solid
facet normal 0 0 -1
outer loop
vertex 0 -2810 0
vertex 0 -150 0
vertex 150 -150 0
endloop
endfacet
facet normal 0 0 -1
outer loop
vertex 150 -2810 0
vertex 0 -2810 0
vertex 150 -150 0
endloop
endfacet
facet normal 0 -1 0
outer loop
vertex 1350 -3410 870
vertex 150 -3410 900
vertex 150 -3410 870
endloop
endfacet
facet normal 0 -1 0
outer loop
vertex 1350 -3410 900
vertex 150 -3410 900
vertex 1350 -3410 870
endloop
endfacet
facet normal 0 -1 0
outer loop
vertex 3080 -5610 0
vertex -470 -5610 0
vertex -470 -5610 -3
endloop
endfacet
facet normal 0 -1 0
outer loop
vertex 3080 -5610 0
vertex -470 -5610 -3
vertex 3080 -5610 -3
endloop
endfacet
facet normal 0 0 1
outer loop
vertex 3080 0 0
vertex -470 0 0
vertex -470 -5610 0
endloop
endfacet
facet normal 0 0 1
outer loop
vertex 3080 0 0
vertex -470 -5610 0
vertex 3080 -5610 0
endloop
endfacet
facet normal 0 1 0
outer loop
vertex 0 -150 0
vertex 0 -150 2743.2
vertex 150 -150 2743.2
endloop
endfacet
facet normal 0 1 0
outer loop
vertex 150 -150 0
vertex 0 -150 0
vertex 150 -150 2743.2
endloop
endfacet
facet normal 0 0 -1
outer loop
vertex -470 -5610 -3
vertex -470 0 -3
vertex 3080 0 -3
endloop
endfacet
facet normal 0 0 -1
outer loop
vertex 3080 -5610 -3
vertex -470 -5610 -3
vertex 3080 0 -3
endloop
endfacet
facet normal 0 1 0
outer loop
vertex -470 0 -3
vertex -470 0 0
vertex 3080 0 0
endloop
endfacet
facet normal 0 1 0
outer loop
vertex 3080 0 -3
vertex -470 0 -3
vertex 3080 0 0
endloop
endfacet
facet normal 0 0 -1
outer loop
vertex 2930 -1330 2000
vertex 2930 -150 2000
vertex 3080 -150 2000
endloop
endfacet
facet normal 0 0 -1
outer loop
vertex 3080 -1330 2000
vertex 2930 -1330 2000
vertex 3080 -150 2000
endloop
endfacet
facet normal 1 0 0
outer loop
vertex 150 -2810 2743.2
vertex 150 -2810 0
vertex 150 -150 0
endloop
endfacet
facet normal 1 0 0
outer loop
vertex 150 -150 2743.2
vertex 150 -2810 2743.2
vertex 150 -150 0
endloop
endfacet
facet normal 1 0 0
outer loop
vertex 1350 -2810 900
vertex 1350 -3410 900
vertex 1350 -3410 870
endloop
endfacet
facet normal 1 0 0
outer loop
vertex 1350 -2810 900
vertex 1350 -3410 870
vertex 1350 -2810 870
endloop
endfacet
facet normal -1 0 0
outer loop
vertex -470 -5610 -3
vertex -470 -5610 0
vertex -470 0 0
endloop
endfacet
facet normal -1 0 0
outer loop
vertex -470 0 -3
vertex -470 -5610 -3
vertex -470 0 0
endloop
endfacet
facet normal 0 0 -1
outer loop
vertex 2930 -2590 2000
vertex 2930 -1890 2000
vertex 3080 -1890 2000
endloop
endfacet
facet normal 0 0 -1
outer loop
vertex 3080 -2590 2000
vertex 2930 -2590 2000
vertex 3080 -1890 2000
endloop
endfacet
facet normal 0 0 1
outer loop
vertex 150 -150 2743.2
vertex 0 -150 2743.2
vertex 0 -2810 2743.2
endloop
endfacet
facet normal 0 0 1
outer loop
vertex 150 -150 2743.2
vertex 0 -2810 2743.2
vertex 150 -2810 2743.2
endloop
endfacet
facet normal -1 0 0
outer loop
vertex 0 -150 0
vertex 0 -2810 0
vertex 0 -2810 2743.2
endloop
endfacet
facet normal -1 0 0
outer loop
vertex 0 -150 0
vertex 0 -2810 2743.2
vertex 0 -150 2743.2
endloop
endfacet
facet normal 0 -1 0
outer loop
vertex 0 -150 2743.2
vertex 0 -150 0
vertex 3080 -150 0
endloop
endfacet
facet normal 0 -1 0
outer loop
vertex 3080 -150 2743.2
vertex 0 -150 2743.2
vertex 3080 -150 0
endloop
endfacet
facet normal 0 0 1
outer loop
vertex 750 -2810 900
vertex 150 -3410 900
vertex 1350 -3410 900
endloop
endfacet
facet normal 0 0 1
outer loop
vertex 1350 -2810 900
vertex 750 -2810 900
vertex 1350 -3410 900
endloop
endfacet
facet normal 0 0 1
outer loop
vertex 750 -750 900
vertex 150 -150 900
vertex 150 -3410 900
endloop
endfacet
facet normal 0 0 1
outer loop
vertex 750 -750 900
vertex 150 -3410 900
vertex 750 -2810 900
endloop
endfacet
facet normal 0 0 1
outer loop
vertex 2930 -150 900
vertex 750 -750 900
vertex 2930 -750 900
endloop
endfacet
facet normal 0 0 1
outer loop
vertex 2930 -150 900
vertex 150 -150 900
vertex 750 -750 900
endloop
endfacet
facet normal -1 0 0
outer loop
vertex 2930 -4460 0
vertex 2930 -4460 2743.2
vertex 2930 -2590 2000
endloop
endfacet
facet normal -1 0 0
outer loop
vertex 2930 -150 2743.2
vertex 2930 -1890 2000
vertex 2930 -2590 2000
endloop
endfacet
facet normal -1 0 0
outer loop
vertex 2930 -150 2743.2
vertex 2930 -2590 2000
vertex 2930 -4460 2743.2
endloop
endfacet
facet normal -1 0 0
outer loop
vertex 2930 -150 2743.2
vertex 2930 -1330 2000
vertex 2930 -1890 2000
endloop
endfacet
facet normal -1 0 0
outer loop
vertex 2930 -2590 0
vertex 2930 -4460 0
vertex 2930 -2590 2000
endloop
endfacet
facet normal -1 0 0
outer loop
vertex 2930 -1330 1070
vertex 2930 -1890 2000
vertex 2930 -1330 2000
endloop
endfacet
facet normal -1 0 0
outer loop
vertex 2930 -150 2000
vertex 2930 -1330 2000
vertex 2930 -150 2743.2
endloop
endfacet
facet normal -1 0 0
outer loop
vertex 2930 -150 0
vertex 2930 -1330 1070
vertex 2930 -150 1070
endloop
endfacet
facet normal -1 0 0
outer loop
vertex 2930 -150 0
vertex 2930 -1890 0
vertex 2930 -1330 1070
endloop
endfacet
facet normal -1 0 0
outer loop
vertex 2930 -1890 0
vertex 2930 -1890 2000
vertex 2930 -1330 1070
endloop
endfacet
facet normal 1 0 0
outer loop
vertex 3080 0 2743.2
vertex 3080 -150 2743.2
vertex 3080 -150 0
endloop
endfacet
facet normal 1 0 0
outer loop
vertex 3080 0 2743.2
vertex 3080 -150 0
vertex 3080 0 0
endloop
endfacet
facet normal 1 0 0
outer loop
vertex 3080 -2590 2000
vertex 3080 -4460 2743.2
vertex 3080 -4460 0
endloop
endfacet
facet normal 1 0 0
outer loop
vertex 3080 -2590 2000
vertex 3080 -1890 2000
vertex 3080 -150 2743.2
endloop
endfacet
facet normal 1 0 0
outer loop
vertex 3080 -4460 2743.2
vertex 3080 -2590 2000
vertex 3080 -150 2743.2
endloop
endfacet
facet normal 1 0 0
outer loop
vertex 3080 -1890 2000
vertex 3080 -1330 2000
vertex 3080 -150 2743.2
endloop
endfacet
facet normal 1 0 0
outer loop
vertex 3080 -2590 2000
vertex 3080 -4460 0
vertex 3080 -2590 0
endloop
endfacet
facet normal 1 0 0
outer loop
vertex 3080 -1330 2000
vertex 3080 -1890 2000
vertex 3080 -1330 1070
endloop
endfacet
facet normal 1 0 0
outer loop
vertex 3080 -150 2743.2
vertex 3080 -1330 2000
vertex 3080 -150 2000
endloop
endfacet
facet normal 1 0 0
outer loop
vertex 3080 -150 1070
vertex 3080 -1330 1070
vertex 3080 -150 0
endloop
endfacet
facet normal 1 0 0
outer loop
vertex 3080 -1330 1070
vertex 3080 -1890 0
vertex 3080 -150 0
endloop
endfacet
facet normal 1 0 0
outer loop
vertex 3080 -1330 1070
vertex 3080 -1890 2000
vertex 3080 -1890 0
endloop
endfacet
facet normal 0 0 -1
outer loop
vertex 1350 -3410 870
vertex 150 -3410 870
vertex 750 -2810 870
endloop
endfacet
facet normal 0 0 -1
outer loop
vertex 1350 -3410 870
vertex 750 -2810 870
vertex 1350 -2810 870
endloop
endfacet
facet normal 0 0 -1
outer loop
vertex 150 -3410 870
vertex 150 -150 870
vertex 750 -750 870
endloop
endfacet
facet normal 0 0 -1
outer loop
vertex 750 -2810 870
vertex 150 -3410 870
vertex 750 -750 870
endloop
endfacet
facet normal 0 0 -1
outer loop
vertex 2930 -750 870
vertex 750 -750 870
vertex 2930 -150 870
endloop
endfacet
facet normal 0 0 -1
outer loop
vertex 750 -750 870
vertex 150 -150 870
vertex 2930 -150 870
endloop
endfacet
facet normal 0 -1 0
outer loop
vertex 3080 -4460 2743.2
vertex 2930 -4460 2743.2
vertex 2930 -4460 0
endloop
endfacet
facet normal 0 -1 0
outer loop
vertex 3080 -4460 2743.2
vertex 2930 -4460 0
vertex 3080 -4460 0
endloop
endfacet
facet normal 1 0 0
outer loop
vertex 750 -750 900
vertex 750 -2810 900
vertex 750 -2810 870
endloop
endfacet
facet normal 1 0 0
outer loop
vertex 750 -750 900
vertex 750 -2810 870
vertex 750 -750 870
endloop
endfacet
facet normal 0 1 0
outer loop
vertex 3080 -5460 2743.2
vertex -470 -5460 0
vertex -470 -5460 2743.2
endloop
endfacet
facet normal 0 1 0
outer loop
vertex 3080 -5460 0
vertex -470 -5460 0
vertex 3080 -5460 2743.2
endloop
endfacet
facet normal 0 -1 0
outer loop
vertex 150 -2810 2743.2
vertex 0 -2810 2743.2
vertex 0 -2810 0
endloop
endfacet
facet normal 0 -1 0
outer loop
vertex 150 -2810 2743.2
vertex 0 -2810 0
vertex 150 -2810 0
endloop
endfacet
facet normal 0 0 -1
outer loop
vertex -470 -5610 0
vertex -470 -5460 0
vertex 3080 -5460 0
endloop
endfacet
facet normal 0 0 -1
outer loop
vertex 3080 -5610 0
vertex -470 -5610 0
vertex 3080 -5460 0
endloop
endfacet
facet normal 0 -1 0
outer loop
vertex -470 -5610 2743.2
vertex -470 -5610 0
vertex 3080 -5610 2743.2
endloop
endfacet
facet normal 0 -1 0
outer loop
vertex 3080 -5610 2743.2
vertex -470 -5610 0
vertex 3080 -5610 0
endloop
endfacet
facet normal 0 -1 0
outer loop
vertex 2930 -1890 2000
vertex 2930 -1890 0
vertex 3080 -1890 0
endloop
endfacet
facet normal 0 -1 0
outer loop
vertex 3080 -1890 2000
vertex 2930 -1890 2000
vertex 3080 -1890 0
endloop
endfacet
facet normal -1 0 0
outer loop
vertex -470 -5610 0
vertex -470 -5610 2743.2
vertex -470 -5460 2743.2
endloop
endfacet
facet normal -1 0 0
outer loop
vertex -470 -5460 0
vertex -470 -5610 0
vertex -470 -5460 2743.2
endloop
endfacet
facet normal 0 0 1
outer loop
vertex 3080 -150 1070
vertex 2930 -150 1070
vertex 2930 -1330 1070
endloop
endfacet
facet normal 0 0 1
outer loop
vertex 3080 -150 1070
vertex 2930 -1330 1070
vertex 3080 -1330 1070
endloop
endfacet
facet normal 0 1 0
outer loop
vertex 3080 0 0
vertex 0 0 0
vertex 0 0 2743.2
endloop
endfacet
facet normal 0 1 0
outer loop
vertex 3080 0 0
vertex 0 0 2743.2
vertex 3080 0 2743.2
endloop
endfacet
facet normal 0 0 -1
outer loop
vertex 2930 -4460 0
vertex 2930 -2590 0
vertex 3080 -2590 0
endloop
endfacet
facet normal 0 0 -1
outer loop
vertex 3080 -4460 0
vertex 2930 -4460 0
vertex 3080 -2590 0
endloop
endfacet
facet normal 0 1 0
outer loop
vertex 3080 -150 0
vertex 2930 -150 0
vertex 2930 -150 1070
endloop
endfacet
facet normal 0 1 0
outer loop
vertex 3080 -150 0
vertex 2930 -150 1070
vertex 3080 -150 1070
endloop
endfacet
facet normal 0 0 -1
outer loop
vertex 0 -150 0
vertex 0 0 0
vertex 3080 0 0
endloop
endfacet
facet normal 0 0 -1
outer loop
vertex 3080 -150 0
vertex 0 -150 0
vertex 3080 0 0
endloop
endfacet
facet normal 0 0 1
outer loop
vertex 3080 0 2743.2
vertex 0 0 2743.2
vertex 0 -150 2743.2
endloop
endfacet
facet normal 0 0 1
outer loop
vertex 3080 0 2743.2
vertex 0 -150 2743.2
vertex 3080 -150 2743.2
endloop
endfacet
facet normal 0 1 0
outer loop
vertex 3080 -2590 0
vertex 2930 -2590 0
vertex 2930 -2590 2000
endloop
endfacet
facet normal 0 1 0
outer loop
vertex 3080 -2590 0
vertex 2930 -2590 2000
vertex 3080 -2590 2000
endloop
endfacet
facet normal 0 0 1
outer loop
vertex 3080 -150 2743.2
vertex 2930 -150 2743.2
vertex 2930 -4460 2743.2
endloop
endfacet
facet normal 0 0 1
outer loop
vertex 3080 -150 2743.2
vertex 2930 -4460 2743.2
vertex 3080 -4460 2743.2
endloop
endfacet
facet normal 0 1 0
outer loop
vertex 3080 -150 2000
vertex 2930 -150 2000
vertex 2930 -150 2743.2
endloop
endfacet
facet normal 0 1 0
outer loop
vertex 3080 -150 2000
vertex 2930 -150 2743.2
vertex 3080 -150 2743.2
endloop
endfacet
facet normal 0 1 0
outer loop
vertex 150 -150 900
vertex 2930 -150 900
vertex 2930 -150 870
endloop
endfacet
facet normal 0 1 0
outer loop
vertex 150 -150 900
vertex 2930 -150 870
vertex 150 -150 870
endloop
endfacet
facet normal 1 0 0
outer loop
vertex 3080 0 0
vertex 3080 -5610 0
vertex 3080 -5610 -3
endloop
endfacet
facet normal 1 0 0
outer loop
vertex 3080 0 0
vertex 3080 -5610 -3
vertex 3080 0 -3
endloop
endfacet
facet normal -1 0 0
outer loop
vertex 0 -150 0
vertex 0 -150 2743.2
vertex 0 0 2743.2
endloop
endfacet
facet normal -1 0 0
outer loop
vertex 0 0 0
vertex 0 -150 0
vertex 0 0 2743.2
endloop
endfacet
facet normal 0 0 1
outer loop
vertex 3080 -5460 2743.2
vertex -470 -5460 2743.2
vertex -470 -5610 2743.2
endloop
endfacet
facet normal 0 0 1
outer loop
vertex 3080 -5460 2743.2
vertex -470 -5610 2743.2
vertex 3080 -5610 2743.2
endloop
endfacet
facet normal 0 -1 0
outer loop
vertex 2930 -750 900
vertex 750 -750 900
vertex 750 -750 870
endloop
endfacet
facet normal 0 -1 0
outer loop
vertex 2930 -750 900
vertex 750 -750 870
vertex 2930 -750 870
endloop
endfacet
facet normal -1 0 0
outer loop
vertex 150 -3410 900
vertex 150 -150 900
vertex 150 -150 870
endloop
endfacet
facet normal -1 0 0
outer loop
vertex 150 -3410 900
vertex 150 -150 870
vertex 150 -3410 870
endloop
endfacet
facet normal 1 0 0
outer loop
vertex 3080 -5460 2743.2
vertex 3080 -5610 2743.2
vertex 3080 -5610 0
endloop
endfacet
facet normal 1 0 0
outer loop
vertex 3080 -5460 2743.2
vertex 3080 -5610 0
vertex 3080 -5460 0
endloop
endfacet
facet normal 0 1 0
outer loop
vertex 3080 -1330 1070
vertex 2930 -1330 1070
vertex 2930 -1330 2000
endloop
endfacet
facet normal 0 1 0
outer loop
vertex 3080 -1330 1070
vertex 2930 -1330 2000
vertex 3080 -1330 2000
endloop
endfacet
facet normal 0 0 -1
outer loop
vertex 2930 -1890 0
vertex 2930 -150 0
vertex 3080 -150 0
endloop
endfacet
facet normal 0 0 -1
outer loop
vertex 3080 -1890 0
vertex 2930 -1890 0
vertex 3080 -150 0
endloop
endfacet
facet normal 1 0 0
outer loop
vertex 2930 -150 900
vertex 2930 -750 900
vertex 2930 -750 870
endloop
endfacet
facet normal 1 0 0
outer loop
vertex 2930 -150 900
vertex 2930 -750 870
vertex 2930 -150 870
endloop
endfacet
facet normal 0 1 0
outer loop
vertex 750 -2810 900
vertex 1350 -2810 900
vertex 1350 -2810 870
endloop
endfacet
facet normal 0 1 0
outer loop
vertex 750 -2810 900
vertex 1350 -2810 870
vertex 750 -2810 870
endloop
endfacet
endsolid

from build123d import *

# Parameters (mm, degrees)
F3_W      = 3080
F3_H      = 150
F4_DEPTH  = 2743.2
F5_W      = 150
F5_H      = 2660
F6_DEPTH  = 2743.2
F7_W      = 150
F7_H      = 4310
F8_DEPTH  = 2743.2
F9_W      = 3550
F9_H      = 150
F10_DEPTH = 2743.2
F11_W     = 3550
F11_H     = 5610
F12_DEPTH = 3
F13_W     = 150
F13_H     = 700
F14_DEPTH = 2000
F15_W     = 150
F15_H     = 1180
F16_DEPTH = 930
F17_W     = 600
F17_H     = 2060
F18_DEPTH = 30


with BuildPart() as f4:
    # F3 (on Top) → F4 (new body)
    with BuildSketch(Plane.XY):
        with Locations((1540, -75)):
            Rectangle(F3_W, F3_H)
    extrude(amount=F4_DEPTH)


with BuildPart() as f6:
    # F5 (on Top) → F6 (new body, through all)
    with BuildSketch(Plane.XY):
        with Locations((75, -1480)):
            Rectangle(F5_W, F5_H)
    extrude(amount=F6_DEPTH)


with BuildPart() as f8:
    # F7 (on Top) → F8 (new body, through all)
    with BuildSketch(Plane.XY):
        with Locations((3005, -2305)):
            Rectangle(F7_W, F7_H)
    extrude(amount=F8_DEPTH)

    # F13 (on Top) → F14 (cut)
    with BuildSketch(Plane.XY):
        with Locations((3005, -2240)):
            Rectangle(F13_W, F13_H)
    extrude(amount=F14_DEPTH, mode=Mode.SUBTRACT)

    # F15 (on offset) → F16 (cut, through all)
    with BuildSketch(Plane.XY.offset(1070)):
        with Locations((3005, -740)):
            Rectangle(F15_W, F15_H)
    extrude(amount=F16_DEPTH, mode=Mode.SUBTRACT)


with BuildPart() as f10:
    # F9 (on Top) → F10 (new body, through all)
    with BuildSketch(Plane.XY):
        with Locations((1305, -5535)):
            Rectangle(F9_W, F9_H)
    extrude(amount=F10_DEPTH)


with BuildPart() as f12:
    # F11 (on Top) → F12 (new body)
    with BuildSketch(Plane.XY):
        with Locations((1305, -2805)):
            Rectangle(F11_W, F11_H)
    extrude(amount=-F12_DEPTH)


with BuildPart() as f18:
    # F17 (on offset) → F18 (new body)
    with BuildSketch(Plane.XY.offset(900)):
        Polygon((2930, -150), (150, -150), (150, -750), (750, -750), (2930, -750), align=None)
        with Locations((450, -1780)):
            Rectangle(F17_W, F17_H)
        Polygon((750, -2810), (150, -2810), (150, -3410), (1350, -3410), (1350, -2810), align=None)
    extrude(amount=-F18_DEPTH)


solid = Compound([f4.part, f6.part, f8.part, f10.part, f12.part, f18.part])
